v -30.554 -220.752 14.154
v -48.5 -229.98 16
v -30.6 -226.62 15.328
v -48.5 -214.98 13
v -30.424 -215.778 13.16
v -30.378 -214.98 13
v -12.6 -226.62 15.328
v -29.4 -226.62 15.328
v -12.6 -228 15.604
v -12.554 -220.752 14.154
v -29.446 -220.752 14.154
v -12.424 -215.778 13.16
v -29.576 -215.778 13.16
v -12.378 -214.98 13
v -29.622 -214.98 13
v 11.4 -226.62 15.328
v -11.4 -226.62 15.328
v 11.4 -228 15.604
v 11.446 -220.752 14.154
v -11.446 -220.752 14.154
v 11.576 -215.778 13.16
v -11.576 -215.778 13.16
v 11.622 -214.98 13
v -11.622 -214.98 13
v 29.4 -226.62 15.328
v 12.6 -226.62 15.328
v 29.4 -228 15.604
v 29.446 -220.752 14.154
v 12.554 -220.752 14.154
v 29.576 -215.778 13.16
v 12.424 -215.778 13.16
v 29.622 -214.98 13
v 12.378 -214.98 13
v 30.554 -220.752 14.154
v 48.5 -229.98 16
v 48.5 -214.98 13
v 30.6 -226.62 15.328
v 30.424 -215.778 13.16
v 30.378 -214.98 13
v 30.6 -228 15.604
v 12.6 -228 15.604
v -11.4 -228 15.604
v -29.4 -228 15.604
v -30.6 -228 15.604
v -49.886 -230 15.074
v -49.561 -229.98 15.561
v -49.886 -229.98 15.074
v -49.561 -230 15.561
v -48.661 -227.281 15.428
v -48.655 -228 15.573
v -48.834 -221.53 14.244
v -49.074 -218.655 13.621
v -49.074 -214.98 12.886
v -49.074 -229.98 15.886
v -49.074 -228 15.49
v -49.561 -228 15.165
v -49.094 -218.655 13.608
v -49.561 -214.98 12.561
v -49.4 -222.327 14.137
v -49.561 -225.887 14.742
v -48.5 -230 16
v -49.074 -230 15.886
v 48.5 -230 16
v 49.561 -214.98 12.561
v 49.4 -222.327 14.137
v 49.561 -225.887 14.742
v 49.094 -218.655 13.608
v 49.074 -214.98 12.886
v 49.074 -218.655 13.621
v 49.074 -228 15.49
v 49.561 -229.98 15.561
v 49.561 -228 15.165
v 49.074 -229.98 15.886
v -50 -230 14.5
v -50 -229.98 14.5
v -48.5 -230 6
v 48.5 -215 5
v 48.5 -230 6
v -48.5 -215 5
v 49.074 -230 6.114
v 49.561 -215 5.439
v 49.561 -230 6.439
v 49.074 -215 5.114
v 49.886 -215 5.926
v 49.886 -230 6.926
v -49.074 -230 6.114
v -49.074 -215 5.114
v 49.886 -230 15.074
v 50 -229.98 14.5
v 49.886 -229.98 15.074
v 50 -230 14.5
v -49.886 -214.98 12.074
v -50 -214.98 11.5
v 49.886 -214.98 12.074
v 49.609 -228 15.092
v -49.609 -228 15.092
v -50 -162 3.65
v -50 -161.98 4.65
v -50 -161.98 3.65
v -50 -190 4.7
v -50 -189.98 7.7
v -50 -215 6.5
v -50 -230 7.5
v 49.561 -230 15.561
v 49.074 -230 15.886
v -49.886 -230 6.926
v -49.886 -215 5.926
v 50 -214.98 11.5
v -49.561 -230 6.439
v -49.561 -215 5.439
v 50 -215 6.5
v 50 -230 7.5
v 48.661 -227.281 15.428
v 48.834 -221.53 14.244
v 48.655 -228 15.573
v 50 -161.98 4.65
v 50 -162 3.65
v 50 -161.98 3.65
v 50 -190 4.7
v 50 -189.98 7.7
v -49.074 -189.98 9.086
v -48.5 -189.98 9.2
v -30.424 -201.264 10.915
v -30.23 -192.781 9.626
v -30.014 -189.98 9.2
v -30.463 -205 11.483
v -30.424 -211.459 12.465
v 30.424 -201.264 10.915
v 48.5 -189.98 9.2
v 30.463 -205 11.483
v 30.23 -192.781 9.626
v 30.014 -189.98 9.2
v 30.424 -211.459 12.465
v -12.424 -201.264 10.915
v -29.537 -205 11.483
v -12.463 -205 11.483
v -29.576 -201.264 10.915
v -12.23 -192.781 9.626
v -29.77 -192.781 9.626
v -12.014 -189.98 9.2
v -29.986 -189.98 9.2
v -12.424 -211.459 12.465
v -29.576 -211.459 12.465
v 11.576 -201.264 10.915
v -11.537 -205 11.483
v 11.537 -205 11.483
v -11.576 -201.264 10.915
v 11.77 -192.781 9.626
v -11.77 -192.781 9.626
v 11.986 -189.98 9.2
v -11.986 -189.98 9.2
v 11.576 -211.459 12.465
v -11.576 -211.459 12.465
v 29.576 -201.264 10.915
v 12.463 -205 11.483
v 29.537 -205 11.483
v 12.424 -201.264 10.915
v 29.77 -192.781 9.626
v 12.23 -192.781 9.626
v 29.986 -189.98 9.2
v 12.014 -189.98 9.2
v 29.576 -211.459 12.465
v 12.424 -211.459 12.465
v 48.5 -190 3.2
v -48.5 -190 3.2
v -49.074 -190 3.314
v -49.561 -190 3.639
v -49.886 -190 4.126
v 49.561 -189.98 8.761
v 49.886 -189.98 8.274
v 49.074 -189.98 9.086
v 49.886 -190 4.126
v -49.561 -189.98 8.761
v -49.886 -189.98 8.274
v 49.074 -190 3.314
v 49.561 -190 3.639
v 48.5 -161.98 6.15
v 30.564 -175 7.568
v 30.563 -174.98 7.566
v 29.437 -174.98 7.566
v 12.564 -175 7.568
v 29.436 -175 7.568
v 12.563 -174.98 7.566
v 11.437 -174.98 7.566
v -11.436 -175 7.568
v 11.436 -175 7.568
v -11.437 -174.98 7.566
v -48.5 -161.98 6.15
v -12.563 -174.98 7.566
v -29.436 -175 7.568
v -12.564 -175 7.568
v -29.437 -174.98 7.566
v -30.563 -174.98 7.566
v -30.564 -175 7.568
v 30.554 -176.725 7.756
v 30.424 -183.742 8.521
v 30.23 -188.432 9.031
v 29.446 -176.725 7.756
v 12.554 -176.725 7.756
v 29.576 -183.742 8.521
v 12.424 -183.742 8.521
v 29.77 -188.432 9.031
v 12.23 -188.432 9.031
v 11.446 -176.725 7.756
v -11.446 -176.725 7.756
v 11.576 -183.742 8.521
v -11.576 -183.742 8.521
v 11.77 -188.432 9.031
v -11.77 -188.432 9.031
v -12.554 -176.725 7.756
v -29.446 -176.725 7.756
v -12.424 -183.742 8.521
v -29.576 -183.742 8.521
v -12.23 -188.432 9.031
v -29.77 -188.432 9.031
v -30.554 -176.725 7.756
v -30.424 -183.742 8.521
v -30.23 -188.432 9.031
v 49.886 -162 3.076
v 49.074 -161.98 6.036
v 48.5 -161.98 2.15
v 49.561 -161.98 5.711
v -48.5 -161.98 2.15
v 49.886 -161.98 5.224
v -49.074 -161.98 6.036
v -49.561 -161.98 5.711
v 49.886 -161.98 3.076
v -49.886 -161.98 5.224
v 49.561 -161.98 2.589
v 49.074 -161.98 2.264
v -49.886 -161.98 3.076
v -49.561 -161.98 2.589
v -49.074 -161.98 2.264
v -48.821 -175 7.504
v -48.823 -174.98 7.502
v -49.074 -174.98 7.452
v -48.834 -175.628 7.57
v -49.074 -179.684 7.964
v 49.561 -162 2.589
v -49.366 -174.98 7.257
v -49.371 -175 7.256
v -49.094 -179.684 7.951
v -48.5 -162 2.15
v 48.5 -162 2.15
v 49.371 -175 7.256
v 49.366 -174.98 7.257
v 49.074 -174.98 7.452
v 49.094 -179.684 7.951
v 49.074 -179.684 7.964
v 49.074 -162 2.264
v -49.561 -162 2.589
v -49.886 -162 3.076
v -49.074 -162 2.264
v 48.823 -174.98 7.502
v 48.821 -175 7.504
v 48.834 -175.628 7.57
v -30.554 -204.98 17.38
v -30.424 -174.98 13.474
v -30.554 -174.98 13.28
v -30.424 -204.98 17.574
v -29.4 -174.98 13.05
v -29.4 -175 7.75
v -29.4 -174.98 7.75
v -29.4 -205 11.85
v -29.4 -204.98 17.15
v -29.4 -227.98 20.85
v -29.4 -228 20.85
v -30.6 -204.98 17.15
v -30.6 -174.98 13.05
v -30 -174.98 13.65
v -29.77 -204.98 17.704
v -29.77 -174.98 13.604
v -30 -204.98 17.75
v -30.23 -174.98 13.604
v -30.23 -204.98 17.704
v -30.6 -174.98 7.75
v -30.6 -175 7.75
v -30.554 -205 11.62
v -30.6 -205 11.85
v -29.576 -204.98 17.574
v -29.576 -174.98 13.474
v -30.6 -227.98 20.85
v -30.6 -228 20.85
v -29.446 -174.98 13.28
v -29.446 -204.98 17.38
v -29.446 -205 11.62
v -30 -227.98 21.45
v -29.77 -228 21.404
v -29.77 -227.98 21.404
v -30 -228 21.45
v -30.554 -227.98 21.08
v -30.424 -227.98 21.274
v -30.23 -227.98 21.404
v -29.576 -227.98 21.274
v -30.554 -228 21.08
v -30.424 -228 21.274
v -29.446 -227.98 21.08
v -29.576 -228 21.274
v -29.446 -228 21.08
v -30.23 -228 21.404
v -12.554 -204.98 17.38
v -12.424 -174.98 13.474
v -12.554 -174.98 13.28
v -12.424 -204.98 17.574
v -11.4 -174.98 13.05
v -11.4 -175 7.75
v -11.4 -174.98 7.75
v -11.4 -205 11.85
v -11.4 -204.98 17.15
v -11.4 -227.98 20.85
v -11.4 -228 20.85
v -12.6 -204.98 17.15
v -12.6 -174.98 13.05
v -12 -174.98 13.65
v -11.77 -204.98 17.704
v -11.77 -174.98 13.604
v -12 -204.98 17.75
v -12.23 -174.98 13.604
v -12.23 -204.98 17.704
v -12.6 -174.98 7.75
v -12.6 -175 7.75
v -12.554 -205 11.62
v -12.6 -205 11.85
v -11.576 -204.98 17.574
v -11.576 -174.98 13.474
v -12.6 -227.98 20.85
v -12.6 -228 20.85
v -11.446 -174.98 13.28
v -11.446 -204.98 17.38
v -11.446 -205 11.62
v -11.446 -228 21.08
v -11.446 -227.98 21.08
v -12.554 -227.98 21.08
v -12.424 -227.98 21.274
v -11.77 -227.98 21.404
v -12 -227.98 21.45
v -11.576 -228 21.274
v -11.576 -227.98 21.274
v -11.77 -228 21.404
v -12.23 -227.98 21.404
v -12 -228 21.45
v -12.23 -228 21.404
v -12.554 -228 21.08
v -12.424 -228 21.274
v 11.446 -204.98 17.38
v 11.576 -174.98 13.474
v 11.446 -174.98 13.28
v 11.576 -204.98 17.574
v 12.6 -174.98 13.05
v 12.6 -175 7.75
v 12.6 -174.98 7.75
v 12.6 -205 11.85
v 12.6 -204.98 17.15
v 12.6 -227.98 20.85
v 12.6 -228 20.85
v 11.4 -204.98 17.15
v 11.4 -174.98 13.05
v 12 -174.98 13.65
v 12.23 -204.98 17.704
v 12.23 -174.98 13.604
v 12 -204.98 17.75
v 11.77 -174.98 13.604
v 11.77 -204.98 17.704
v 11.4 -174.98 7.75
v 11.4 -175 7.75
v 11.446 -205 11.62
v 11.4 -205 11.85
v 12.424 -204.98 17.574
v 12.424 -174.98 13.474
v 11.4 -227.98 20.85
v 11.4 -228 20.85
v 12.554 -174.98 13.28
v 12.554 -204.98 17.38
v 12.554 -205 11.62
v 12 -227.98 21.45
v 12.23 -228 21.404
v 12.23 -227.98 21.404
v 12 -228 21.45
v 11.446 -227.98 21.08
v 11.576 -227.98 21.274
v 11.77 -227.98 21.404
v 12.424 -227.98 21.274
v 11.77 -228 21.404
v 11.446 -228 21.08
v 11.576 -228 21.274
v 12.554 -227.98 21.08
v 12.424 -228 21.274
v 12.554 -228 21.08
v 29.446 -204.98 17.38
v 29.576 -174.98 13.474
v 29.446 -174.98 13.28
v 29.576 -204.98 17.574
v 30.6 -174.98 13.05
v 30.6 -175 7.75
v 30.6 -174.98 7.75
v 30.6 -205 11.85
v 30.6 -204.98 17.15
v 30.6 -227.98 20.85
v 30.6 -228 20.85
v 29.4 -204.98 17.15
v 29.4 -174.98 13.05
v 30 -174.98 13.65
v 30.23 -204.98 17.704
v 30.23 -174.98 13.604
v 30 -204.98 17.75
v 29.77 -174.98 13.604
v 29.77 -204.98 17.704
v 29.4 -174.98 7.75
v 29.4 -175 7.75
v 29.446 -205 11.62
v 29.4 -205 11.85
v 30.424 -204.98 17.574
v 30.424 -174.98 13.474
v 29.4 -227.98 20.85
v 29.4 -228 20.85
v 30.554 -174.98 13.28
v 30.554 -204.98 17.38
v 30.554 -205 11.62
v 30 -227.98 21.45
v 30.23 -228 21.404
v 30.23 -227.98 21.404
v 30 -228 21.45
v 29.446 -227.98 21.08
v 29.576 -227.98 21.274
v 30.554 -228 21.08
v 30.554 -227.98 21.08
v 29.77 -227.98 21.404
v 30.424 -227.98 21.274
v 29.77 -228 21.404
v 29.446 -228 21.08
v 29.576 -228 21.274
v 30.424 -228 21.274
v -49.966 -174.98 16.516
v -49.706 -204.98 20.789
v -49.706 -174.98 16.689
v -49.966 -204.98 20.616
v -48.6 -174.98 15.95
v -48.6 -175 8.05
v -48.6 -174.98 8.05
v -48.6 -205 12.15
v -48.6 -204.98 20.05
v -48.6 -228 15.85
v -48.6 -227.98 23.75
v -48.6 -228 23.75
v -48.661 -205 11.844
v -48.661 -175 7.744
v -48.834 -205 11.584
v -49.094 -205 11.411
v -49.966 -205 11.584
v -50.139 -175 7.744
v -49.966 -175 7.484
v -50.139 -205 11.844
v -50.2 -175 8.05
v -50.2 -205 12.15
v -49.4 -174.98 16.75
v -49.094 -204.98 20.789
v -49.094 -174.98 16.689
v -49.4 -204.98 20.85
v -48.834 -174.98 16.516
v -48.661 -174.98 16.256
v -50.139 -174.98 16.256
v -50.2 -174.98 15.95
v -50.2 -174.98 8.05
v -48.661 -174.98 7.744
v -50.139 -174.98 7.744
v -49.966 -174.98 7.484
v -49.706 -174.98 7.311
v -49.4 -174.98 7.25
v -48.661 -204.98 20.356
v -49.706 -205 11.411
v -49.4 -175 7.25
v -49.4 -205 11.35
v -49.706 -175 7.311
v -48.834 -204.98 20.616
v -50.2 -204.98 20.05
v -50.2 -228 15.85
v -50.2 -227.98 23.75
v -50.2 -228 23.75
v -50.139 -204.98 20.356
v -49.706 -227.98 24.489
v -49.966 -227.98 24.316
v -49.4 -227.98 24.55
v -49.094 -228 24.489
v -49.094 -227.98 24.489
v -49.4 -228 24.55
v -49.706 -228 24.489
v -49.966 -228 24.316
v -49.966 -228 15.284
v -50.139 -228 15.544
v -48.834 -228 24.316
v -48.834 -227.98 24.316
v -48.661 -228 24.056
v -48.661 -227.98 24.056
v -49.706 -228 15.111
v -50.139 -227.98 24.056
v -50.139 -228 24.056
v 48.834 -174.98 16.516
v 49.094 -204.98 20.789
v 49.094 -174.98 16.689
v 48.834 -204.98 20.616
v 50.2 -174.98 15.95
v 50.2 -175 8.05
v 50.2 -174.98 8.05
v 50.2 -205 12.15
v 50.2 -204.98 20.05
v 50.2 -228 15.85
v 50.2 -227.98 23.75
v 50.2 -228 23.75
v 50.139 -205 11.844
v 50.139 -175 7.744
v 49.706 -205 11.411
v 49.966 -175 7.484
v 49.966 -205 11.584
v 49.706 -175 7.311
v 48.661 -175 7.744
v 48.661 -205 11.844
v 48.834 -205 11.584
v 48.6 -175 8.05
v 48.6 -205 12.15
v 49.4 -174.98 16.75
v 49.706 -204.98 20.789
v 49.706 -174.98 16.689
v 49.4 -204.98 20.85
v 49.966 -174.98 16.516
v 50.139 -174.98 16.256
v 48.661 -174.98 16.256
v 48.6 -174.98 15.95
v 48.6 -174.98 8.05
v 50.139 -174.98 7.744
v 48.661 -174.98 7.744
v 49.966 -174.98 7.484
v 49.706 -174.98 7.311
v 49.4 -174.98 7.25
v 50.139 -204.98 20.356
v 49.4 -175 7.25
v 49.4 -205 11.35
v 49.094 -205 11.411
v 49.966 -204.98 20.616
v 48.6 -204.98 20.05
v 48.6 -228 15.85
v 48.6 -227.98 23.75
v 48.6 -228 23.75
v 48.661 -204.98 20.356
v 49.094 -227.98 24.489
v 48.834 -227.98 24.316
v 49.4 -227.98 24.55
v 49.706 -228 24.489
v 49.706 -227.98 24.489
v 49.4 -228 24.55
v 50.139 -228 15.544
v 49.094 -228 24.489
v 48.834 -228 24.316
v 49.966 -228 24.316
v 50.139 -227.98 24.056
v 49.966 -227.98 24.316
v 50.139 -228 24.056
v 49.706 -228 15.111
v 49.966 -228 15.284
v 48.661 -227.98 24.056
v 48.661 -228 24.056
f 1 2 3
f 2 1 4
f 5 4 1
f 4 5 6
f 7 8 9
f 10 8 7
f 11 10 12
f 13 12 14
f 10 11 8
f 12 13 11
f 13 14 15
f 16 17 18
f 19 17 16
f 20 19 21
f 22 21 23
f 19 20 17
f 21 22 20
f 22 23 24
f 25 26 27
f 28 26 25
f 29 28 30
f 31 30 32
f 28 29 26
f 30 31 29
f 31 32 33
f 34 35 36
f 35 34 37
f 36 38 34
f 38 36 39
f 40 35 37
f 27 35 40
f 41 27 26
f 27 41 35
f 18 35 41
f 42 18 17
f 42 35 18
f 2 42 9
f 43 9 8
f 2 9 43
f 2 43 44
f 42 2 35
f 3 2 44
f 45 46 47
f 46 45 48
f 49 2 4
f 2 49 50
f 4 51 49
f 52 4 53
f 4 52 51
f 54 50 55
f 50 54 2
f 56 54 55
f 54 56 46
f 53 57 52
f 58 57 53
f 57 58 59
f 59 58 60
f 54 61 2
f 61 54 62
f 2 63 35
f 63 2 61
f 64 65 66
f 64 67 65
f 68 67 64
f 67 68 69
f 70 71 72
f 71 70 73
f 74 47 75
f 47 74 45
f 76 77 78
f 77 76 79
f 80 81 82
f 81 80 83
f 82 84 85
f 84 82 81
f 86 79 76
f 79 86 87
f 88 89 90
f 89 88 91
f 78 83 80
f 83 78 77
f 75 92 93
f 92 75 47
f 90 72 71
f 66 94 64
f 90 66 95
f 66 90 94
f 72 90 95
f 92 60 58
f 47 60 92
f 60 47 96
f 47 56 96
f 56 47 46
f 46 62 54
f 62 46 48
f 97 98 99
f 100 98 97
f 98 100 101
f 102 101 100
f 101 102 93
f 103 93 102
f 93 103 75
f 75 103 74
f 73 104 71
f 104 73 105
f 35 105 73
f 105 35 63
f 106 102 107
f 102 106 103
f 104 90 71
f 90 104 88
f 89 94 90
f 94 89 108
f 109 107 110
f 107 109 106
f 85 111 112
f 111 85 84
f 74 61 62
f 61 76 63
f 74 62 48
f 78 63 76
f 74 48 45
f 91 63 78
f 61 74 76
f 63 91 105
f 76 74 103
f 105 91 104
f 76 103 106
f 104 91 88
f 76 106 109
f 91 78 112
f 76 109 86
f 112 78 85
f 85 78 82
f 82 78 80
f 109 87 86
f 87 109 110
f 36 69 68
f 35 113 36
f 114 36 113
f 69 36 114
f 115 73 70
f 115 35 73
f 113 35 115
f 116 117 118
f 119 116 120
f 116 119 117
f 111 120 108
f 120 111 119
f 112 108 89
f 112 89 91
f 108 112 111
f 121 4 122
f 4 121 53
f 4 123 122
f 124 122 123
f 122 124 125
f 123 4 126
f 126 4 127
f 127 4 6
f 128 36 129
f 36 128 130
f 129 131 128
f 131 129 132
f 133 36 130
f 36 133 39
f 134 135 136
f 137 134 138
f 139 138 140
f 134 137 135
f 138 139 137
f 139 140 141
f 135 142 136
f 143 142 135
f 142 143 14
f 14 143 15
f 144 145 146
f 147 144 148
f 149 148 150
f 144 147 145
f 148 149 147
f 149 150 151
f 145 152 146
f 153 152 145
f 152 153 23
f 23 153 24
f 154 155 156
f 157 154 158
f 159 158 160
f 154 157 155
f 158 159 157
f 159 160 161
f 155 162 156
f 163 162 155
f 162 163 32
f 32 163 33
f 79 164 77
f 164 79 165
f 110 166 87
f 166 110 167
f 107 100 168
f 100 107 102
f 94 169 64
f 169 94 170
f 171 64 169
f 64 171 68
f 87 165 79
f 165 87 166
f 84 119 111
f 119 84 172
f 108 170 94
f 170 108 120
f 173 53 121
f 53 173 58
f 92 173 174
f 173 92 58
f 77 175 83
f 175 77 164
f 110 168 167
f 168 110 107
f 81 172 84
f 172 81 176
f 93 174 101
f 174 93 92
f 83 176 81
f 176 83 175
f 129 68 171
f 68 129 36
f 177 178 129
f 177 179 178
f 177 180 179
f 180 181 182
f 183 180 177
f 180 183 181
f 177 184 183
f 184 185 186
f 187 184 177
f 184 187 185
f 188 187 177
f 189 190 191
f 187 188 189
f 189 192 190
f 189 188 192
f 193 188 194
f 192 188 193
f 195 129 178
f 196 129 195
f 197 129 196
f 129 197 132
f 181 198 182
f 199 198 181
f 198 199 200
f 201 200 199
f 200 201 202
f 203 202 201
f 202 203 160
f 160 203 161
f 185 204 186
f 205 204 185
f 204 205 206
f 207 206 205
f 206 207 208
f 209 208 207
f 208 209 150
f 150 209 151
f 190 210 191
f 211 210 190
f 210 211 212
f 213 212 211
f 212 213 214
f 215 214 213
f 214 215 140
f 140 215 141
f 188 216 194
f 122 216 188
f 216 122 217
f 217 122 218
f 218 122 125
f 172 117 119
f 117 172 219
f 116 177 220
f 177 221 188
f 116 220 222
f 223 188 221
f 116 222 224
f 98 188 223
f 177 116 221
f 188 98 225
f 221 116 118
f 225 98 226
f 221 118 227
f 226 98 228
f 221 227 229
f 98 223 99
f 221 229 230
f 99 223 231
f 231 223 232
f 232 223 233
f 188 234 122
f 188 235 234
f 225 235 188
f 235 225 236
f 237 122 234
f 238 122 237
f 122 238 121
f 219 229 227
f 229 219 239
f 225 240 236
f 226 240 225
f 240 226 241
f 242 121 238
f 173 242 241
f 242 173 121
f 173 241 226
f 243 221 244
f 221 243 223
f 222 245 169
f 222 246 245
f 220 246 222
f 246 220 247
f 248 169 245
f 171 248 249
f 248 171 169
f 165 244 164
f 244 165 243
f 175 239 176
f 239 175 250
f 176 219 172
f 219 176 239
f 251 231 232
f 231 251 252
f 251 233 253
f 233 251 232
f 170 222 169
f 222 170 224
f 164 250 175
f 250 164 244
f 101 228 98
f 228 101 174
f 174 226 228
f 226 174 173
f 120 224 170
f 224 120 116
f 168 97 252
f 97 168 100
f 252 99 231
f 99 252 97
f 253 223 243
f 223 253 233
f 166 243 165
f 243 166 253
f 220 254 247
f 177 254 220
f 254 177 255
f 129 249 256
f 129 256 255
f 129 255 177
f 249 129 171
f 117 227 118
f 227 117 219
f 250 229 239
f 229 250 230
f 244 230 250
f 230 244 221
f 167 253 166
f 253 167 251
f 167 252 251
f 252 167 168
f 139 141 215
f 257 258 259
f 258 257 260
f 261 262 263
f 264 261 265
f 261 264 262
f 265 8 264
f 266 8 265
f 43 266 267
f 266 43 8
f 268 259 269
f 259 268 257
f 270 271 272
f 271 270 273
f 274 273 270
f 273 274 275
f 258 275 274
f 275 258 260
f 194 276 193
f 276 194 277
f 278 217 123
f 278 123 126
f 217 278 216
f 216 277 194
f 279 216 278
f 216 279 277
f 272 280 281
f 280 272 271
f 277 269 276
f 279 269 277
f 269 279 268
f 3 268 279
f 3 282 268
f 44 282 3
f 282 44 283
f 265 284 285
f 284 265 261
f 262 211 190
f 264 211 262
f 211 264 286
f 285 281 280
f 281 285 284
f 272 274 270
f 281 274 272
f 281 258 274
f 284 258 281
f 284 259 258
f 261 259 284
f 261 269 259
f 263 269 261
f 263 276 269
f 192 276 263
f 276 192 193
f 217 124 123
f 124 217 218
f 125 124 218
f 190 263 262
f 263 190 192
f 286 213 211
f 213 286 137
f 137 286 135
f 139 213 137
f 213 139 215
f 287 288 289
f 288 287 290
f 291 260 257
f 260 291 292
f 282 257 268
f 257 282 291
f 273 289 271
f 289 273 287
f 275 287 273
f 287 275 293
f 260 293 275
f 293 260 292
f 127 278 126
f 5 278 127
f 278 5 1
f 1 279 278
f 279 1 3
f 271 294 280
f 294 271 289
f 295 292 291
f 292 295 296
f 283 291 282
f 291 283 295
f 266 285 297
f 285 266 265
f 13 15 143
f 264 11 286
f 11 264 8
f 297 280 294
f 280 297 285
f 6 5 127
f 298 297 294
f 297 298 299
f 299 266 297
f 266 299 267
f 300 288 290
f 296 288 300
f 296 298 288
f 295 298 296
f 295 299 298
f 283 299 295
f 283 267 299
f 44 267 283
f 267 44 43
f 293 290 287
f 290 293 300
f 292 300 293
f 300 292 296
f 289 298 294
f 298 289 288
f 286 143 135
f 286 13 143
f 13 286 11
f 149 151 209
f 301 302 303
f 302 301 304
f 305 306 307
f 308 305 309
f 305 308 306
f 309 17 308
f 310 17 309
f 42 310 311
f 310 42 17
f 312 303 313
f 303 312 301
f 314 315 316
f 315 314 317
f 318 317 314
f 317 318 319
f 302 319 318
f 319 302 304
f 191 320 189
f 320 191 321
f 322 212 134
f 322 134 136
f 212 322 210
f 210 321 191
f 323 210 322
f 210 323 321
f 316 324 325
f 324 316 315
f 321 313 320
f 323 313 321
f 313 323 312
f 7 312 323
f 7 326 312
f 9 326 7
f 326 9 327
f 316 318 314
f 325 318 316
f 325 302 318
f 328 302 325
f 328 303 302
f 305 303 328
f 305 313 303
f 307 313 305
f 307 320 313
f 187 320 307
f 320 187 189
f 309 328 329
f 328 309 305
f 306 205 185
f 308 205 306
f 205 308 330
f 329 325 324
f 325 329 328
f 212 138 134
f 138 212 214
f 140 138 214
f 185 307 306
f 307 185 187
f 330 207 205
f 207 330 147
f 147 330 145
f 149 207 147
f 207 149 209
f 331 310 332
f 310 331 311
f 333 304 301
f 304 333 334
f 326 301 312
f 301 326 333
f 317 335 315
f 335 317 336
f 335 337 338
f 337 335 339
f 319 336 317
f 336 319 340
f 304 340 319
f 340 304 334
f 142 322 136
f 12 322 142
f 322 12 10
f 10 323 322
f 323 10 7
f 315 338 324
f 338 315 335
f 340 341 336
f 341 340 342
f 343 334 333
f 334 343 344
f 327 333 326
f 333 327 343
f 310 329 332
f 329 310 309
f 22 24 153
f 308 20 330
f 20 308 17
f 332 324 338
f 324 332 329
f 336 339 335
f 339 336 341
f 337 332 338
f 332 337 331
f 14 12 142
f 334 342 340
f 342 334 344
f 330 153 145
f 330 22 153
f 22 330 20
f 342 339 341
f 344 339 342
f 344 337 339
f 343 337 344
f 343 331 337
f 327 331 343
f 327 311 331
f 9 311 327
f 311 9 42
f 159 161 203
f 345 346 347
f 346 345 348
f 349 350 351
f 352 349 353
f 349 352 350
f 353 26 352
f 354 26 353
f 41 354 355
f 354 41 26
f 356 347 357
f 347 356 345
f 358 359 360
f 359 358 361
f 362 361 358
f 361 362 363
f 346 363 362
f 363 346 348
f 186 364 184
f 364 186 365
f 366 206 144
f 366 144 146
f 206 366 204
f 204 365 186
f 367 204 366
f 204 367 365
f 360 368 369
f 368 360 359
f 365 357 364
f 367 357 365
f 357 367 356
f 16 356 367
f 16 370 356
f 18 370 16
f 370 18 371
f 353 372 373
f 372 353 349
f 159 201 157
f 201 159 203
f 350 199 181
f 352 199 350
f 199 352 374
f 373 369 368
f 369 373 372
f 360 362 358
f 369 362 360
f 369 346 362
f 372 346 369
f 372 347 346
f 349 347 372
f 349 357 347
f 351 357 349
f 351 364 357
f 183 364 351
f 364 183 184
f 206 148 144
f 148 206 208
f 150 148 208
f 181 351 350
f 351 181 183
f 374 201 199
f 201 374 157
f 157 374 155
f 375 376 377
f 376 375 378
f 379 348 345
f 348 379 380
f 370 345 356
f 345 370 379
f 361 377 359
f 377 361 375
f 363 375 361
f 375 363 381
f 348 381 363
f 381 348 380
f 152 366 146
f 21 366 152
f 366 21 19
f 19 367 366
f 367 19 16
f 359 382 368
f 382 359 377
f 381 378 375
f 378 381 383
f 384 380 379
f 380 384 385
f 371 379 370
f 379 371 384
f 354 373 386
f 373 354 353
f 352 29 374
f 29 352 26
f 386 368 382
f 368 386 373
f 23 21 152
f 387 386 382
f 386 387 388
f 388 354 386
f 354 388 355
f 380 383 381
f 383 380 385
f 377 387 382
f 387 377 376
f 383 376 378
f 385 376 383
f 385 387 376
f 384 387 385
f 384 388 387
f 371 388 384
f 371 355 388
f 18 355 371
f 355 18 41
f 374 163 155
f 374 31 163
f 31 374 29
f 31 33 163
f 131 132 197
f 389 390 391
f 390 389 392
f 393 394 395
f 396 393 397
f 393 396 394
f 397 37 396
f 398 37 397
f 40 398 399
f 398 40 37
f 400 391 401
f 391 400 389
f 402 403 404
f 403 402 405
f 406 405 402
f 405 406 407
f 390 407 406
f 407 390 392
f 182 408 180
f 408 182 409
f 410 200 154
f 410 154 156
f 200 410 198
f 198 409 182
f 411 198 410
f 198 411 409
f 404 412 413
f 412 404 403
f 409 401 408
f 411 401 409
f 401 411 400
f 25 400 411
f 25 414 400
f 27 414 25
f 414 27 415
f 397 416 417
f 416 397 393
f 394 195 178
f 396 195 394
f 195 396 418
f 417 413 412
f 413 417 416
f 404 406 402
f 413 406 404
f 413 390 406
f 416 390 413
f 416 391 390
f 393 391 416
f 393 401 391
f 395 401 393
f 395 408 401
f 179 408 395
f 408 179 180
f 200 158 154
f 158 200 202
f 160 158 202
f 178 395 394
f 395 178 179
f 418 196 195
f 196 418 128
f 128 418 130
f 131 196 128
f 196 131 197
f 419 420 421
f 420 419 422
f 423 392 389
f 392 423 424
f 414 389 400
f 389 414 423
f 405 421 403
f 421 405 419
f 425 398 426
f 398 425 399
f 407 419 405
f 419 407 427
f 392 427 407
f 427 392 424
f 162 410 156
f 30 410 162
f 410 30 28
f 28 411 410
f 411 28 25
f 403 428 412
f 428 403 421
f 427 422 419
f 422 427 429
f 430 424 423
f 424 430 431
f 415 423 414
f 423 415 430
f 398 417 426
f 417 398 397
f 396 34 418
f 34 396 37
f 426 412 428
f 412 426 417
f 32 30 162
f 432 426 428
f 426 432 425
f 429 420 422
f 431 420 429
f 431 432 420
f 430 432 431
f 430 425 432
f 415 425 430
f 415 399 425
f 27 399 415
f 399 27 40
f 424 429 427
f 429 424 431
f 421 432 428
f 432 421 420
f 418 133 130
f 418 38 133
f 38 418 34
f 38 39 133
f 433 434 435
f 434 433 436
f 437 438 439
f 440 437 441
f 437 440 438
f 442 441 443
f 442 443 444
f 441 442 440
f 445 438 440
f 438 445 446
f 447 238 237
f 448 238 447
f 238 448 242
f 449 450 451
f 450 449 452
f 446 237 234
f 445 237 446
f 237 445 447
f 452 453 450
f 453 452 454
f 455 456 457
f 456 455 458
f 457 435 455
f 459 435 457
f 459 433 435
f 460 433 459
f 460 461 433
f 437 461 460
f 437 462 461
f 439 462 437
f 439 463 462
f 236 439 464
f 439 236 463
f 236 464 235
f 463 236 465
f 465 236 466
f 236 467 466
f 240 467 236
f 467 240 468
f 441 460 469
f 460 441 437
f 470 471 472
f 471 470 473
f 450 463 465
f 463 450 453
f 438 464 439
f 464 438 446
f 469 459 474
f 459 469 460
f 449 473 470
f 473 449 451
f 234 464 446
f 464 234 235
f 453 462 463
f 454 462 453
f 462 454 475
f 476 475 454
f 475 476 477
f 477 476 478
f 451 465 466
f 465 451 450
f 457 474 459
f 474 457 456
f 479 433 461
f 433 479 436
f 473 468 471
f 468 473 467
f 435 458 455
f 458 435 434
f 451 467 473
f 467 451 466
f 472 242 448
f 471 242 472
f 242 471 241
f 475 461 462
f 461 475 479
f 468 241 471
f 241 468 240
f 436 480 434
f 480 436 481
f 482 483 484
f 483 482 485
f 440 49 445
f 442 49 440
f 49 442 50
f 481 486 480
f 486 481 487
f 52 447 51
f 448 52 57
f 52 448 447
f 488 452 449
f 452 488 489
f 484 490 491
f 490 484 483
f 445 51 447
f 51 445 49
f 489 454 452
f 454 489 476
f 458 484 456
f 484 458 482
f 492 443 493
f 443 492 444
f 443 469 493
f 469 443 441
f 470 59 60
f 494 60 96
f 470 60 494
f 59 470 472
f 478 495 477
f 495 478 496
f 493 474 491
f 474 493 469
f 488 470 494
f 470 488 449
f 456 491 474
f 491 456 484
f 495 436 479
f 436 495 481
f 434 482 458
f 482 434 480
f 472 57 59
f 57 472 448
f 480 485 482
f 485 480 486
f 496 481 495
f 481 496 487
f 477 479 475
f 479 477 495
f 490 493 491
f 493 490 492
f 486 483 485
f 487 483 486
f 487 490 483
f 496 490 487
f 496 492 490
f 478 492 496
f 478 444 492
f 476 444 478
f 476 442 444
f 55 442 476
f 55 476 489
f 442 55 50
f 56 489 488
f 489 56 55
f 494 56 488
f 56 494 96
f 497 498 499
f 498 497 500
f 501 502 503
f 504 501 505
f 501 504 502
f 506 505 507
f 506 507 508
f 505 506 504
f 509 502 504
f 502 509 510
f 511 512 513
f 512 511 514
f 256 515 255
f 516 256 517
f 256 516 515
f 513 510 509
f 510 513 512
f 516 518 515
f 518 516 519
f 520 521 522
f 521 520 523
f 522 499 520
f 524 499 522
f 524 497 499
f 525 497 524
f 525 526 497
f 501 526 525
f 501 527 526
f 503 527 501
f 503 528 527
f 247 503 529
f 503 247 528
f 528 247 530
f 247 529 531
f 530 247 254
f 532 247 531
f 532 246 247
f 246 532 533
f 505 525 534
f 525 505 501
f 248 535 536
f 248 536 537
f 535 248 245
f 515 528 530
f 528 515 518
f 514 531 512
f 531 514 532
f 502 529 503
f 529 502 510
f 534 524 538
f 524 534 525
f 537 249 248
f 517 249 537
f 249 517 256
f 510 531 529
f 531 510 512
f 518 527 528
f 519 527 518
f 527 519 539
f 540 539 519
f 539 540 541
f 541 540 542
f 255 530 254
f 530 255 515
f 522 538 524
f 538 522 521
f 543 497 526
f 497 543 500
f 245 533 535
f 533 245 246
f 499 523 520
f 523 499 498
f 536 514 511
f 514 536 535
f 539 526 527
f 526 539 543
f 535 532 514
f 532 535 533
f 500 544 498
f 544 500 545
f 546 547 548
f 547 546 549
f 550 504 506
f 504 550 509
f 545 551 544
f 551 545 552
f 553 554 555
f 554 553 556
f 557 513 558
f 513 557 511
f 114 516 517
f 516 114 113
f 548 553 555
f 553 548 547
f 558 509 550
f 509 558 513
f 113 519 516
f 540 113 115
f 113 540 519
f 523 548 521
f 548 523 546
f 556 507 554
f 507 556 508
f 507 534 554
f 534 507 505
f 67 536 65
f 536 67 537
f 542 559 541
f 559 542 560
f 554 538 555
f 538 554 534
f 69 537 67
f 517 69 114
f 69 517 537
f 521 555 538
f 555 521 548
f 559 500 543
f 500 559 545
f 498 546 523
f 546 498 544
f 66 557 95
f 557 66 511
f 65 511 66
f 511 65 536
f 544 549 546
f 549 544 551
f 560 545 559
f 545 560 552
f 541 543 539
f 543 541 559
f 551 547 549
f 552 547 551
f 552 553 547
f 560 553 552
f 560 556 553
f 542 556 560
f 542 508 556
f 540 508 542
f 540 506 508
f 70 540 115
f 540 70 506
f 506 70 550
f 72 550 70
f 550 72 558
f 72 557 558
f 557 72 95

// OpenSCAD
// file: ../lib.scad
// ===== 공용 프리미티브 (params 의존 없음 — use로 포함. 함정 1) =====

// 두 점을 잇는 캡슐. 끝단이 od/2 만큼 뻗는다 (함정 3)
module rod(p1, p2, od, fn = 56)
    hull() { translate(p1) sphere(d = od, $fn = fn);
             translate(p2) sphere(d = od, $fn = fn); }

function mir(p, s = 1) = [s * p.x, p.y, p.z];

// --- 라운디드 사각 2D 폴리곤 (CCW) ---
function arc_pt(cx, cy, r, a) = [cx + r * cos(a), cy + r * sin(a)];
function rrpts(w, h, r, n = 4) =
    let (x = w / 2 - r, y = h / 2 - r)
    concat(
        [for (i = [0:n]) arc_pt( x, -y, r, -90 + 90 * i / n)],
        [for (i = [0:n]) arc_pt( x,  y, r,   0 + 90 * i / n)],
        [for (i = [0:n]) arc_pt(-x,  y, r,  90 + 90 * i / n)],
        [for (i = [0:n]) arc_pt(-x, -y, r, 180 + 90 * i / n)]);

// y 위치의 XZ 단면 슬래브 (중심 x0/zc, 폭 w/높이 h, 모서리 r).
// 회전 매핑: 2D x→차량 X, 2D y→차량 Z, 돌출 +z→−Y (y..y+0.02 전방 전용, 함정 20)
module slabr(y, x0, w, h, zc, r)
    translate([x0, y + 0.02, zc]) rotate([90, 0, 0])
        linear_extrude(0.02) polygon(rrpts(w, h, r));

// 단면 체인 loft: sec = [[y, x0, w, h, zc, r], ...]
module loftr(sec)
    for (i = [0 : len(sec) - 2])
        hull() {
            slabr(sec[i][0],     sec[i][1],     sec[i][2],     sec[i][3],     sec[i][4],     sec[i][5]);
            slabr(sec[i + 1][0], sec[i + 1][1], sec[i + 1][2], sec[i + 1][3], sec[i + 1][4], sec[i + 1][5]);
        }

// 라운디드 박스 (z0..z1 수직, 평면 모서리 r)
module rbox(xc, yc, z0, z1, dx, dy, r, fn = 32)
    hull() for (px = [-1, 1], py = [-1, 1])
        translate([xc + px * (dx / 2 - r), yc + py * (dy / 2 - r), z0])
            cylinder(r = r, h = z1 - z0, $fn = fn);

// --- NACA 계열 에어포일 (LE 원점, 2D +x = 현 방향) ---
function _yt(x, c, t) = 5 * t * c * (0.2969*sqrt(x) - 0.1260*x - 0.3516*x*x
    + 0.2843*x*x*x - 0.1036*x*x*x*x);
function _yc(x, c, m) = 4 * m * c * x * (1 - x);
function naca_pts(c, t, m, n = 12) =
    concat(
        [for (i = [0:n])     let (x = i / n)     [x*c,  _yt(x, c, t) + _yc(x, c, m)]],
        [for (i = [n-1:-1:0]) let (x = i / n)    [x*c, -_yt(x, c, t) + _yc(x, c, m)]]);

// 슬라이스 3D 링: v=[x, yle, zle, c, aoa, th, cam] → 받각 회전된 naca 점의 링
// (th/cam은 mm — 현 대비 비율로 정규화)
function wring(v, n = 12) =
    let (c = v[3], t = v[5] / c, m = v[6] / c, pts = naca_pts(c, t, m, n),
         ca = cos(v[4]), sa = sin(v[4]))
    // 코드 방향 (ca,sa) + 두께/캠버 수직 방향 (-sa,ca) — 2D y 누락 금지
    [for (p = pts) [v[0], v[1] + p[0] * ca - p[1] * sa, v[2] + p[0] * sa + p[1] * ca]];

// 진짜 로프트 윙 — polyhedron 스트립. hull 체인은 캠버진 하면을 볼록 껍질로
// 채워(LE→TE 직선 웨지) 요소가 처지므로 쓰지 않는다
module wing3(sl, n = 12) {
    rings = [for (v = sl) wring(v, n)];
    ns = len(rings);
    m = len(rings[0]);
    pts = [for (r = rings, p = r) p];
    function ix(i, k) = i * m + (k % m);
    faces = concat(
        // 측면 스트립 (사중면 → 삼각형 2) — 외향 노멀 권선(캡과 일치)
        [for (i = [0 : ns - 2], k = [0 : m - 1])
            each [[ix(i, k), ix(i, k + 1), ix(i + 1, k + 1)],
                  [ix(i, k), ix(i + 1, k + 1), ix(i + 1, k)]]],
        // 끝 캡 (링은 단순 폴리곤 — 팬 삼각분할)
        [for (k = [1 : m - 2]) [ix(0, 0), ix(0, k + 1), ix(0, k)]],
        [for (k = [1 : m - 2]) [ix(ns - 1, 0), ix(ns - 1, k), ix(ns - 1, k + 1)]]
    );
    polyhedron(points = pts, faces = faces, convexity = 4);
}

// 반쪽 슬라이스 → x-대칭 전체. 규약: half는 센터(x=0)→팁 순서(내림차순 x).
// 결과는 x 오름차순 체인. x=0 센터만 중복 제외 (그 외 전부 미러)
function wsym(half) =
    concat([for (i = [len(half) - 1 : -1 : 0]) half[i]],
           [for (i = [0 : len(half) - 1]) if (abs(half[i][0]) > 1e-9)
               concat([-half[i][0]], [for (j = [1 : len(half[i]) - 1]) half[i][j]])]);

// 환(링), 축 Z
module ann(r_in, r_out, h, fn = 96)
    difference() { cylinder(r = r_out, h = h, center = true, $fn = fn);
                   cylinder(r = r_in,  h = h + 2, center = true, $fn = fn); }

// 리스트 전체 x반전+순서 역행 (센터 구간 없는 플랩 등 — 좌우 별도 wing3 호출용).
// x반전만 하면 행렬식이 음수가 되어 권선이 뒤집힌다 → 순서 역행으로 상쇄
function msym(half) =
    [for (i = [len(half) - 1 : -1 : 0])
        concat([-half[i][0]], [for (j = [1 : len(half[i]) - 1]) half[i][j]])];
// file: ../params.scad
// =====================================================================
// F1 그랜드파이언스 카 1:10 — 전체 파라미터 (유일한 수정 지점)
// 좌표계: +Y 전방, +X 좌측, +Z 상방, 지면 z=0, 원점=휠베이스 중심
// 전장 558 (y -268..+278), 전폭 194, 휠베이스 360, 타이어 OD 72 (720mm)
// 30부품. loftr 단면 = [y, x0, w, h, zc, r] (XZ 단면, y..y+0.02 슬래브)
// wing3 슬라이스 = [x, yle, zle, c, aoa, th, cam]
//   aoa: 현 방향의 X축 회전각. 전방 받각 요소는 165~170 (TE가 뒤+위)
// =====================================================================
$fn = 96;

// -- 휠/액슬 (실차 720mm 타이어, 18인치 림, 트랙 F1600/R1550) --
AXF_Y = 180;   AXR_Y = -180;
WHF_X = 80;    WHR_X = 77.5;
WH_Z  = 36;
TIRF_W = 30.5; TIRR_W = 40.5;  TIR_R = 36;
TIR_FN = 288;                 // 타이어 회전체 해상도
RIM_R = 23.2;  RIM_T = 1.0;   // 림 배럴 반경/두께
RIM_LF = 12.4; RIM_LR = 17.4; // 림 배럴 반폭
HUB_BORE = 7.0; STUB_D = 6.2; // 방사 간극 0.4
DISC_R = 15.5;                // 브레이크 디스크

// -- 바디 공통 레벨 --
FLO_Z0 = 2.0;  FLO_Z1 = 5.5;  // 플로어 (두께 3.5)
BOD_Z0 = 5.65;                // 샤시/카버/기어박스 바닥 (플로어 위 0.15)
J = 0.15;                     // 부품 접합 기본 간극
ARM_OD = 3.4;                 // 서스펜션 암 캡슐 직경

// ===== 01 플로어 =====
FLOOR_SEC = [
    [132,    0,  92, 3.5, 3.75, 1.5], [100, 0, 118, 3.5, 3.75, 1.5],
    [60,     0, 130, 3.5, 3.75, 2.0], [10,  0, 132, 3.5, 3.75, 2.0],
    [-60,    0, 128, 3.5, 3.75, 2.0], [-120, 0, 112, 3.5, 3.75, 2.0],
    [-161.85, 0, 100, 3.5, 3.75, 2.0]];

// ===== 02 디퓨저 (램프 + 스트레이크는 부품 내부) =====
DIFF_SEC = [
    [-230,   0, 100, 10.0, 11.0, 1.5], [-215, 0, 100, 8.0,  9.0, 1.5],
    [-190,   0, 100,  6.0,  6.2, 1.5], [-162.0, 0, 100, 4.0, 4.15, 1.5]];
DIFF_TOP = [[-175, 7.8], [-205, 11.9], [-228, 15.6]];  // (y, 램프 상면 z)

// ===== 03 플로어 에지 윙 =====
FEW_SEC = [   // [y, x0, w, h, zc, r] — x0 부호로 좌우
    [55,   63.5, 3.0, 2.0, 6.65, 1.0], [-5,  65.5, 3.0, 5.5, 8.40, 1.5],
    [-70,  63.0, 3.0, 4.0, 7.65, 1.5], [-120, 58.0, 3.0, 3.0, 7.15, 1.5]];
FEW2_SEC = [
    [100, 57.0, 2.5, 1.5, 6.40, 0.8], [60, 60.0, 2.5, 2.0, 6.65, 0.8]];

// ===== 04 노우즈 =====
NOSE_SEC = [
    [95,   0, 38, 28, 25.3, 12], [100,  0, 38, 29, 25.3, 12],
    [115,  0, 36, 28, 23.8, 11], [135,  0, 31, 24, 21.3,  9],
    [160,  0, 27, 20, 18.3,  8], [185,  0, 23, 17, 15.8,  7],
    [205,  0, 20, 15, 14.3,  6], [224,  0, 17, 12, 12.3,  5],
    [242,  0, 14,  9, 10.8,  4], [258,  0, 10,  7, 10.1,  3],
    [272,  0,  4.5, 4.5, 9.8, 2], [273.5, 0, 1.2, 1.2, 9.8, 0.6]];

// ===== 05 샤시(모노코크) + 콕핏 컷 =====
CHAS_SEC = [
    [-34.85, 0, 46, 44, 27.65, 15], [-10, 0, 48, 46, 28.65, 15],
    [20,     0, 48, 44, 27.65, 15], [60,  0, 46, 40, 25.65, 14],
    [94.85,  0, 42, 34, 22.65, 12]];
CKP_CUT = [[62, 0, 34, 32, 46, 3], [-30, 0, 34, 30, 45, 3]];

// ===== 06 엔진 커버 + 샤크핀 =====
COV_SEC = [
    [-152,   0,  8, 14, 35.65,  6], [-140, 0, 12, 18, 32.65,  7],
    [-120,   0, 18, 24, 29.65,  9], [-95,  0, 26, 30, 26.15, 11],
    [-70,    0, 34, 36, 25.65, 13], [-50,  0, 40, 40, 25.65, 14],
    [-35.15, 0, 44, 42, 26.65, 15]];
FIN_SEC = [
    [-162, 0, 2.2, 44, 62.0, 1], [-120, 0, 2.5, 30, 56.0, 1],
    [-92.2, 0, 2.5, 10, 45.0, 1]];

// ===== 07 에어박스 (험프 + 인테이크 링) =====
ABX_SEC = [
    [-92, 0, 14, 17, 50.00, 6], [-68, 0, 20, 24, 56.60, 8],
    [-46, 0, 22, 26, 59.60, 8], [-34, 0, 22, 13, 56.30, 6]];
ABX_RING_C = [0, -45, 73.5];  ABX_RING_R = 11;  ABX_RING_T = 4.5;
ABX_RING_SZ = 0.72;

// ===== 08 사이드포드 (x0=±41.5) =====
SPOD_X0 = 41.5;
SPOD_SEC = [   // [y, w, h, zc, r]
    [38,   34, 26, 18.65, 8], [5,   34, 28, 19.65, 9], [-25,  34, 26, 18.65, 9],
    [-55,  32, 21, 18.15, 8], [-80, 30, 15, 17.15, 8], [-100, 26,  9, 16.15, 7]];
SPOD_INLET = [24, 18, 19, 2.3];  // 컷: w, h, zc, 깊이

// ===== 09 할로 =====
HALO_N = 28;  HALO_OD = 9;
HALO_RX = 22; HALO_RY = 44; HALO_CY = 12;  // 타원 계획면(평면도)
HALO_Z0 = 75; HALO_ZA = 2;                 // z(t) = Z0 + ZA*cos(t)

// ===== 10/11/12/13 프런트 윙 =====
FW_MAIN_HALF = [   // 반쪽(x≤0) — wsym()로 전체화
    [0,    258.3, 2.4, 20, 170, 1.4, 2.0],
    [-16,  259.0, 3.4, 27, 165, 1.6, 2.4],
    [-40,  260.0, 3.6, 40, 166, 1.8, 2.8],
    [-60,  257.0, 4.0, 37, 167, 1.7, 2.6],
    [-80,  258.0, 4.4, 31, 166, 1.6, 2.2],
    [-95.2, 263.0, 4.6, 26, 166, 1.5, 1.8]];
FW_F1_HALF = [
    [-16,  253.0, 8.0, 22, 155, 1.3, 4.0],
    [-40,  250.5, 8.2, 26, 156, 1.4, 4.2],
    [-60,  249.5, 8.4, 26, 157, 1.4, 4.2],
    [-80,  250.0, 8.6, 24, 158, 1.4, 4.0],
    [-95.2, 254.0, 8.8, 21, 158, 1.3, 3.5]];
FW_F2_HALF = [
    [-16,  258.0, 12.4, 17, 147, 1.2, 4.5],
    [-40,  255.5, 12.6, 20, 148, 1.3, 4.8],
    [-60,  254.5, 12.8, 20, 149, 1.3, 4.8],
    [-80,  254.5, 13.0, 19, 150, 1.3, 4.5],
    [-95.2, 258.0, 13.2, 17, 150, 1.2, 4.0]];
FW_EP_X = 96.3;  FW_EP_T = 1.5;   // 엔드플레이트 x 중심/두께
FW_EP_PTS = [    // (y,z) 아웃라인
    [226, 1.5], [266, 1.5], [266, 8], [263, 24.5], [252, 24.5],
    [244, 17], [233, 15], [226, 9]];
FW_MT_SEC = [   // 마운트 플레이트 [y, x0(±2.6), w, h, zc, r] — 노우즈 저면 라운딩 회피
    [244, 2.6, 1.6, 1.8, 5.25, 0.5], [250, 2.6, 1.6, 1.8, 5.25, 0.5]];

// ===== 14 리어 윙 =====
RW_MAIN = [
    [-50.8, -212, 57.5, 46, 162, 2.2, -3.5], [-25, -211, 56.6, 47, 162, 2.3, -4.0],
    [0,     -210, 54.2, 47, 162, 2.3, -4.0], [25,  -211, 56.6, 47, 162, 2.3, -4.0],
    [50.8,  -212, 57.5, 46, 162, 2.2, -3.5]];
RW_FLAP = [
    [-49.6, -234,   71.8, 30, 155, 1.8, -4.5],
    [0,     -235.5, 73.0, 30, 155, 1.8, -4.5],
    [49.6,  -234,   71.8, 30, 155, 1.8, -4.5]];
RW_EP_X = 52;  RW_EP_T = 2;
RW_EP_PTS = [
    [-200, 46], [-268, 46], [-268, 60], [-262, 93], [-250, 93],
    [-243, 72], [-218, 64], [-202, 74]];
RW_DRS = [-245, 79.4, 5.0, 2.6, 3.0];   // 팟: y, z, w, h, 두께

// ===== 15 빔 윙 =====
BEAM_E1 = [
    [-50.9, -204.5, 31.5, 16, 162, 1.8, -2.5], [0, -205.5, 30.4, 16, 162, 1.8, -2.5],
    [50.9,  -204.5, 31.5, 16, 162, 1.8, -2.5]];
BEAM_E2 = [
    [-50.9, -210, 36.8, 15, 158, 1.6, -3.0], [0, -211, 35.6, 15, 158, 1.6, -3.0],
    [50.9,  -210, 36.8, 15, 158, 1.6, -3.0]];
BEAM_PLATE = [-214, -200.15, 8.2, 22, 31];  // 마운트 플레이트 y1,y0,x반폭,z0,z1

// ===== 16 리어윙 파일론(쌍둥 스완넥) =====
RW_PYL = [[-158, 55.0], [-190, 58.0], [-212.5, 63.0]];  // (y, z), x=±5.4
RW_PYL_X = 5.4;  RW_PYL_OD = 8;

// ===== 17 미러 =====
MIR_BASE = [14, 63, 46.0];  MIR_HOUSE = [31, 66, 56.5];

// ===== 18 헬멧 =====
HELM_C = [0, 0, 55];  HELM_R = 11.5;
HELM_SC = [1, 1.18, 1.02];

// ===== 19 콕핏 트림 =====
SEAT_SEC  = [[30, 0, 26, 13.2, 36.75, 3], [-10, 0, 26, 13.2, 36.75, 3]];
HREST_SEC = [[12, 0, 32, 15, 53.5, 5], [-20, 0, 32, 15, 53.5, 5]];

// ===== 20 스티어링 휠 =====
SW_C = [0, 40, 47];  SW_TILT = 20;

// ===== 21/22 서스펜션 (픽업=[x, y, z], 암 끝은 업라이트 내부) =====
FUP = [61, 183, 46];  FLO_BALL = [61.5, 181, 24];  FTR = [61.5, 177, 35];
FPU = [61.5, 180, 27];
F_ARM = [   // [픽업, 볼]
    [[12.0, 206, 20.0], FUP],  [[16.0, 152, 23.0], FUP],
    [[11.9, 208,  9.3], FLO_BALL], [[16.3, 150, 12.0], FLO_BALL],
    [[15.6, 162, 14.0], FTR]];
F_PUSH = [[11.8, 198, 24.4], FPU];
RUP = [53.5, -182, 46];  RLO = [54, -179, 23];  RDRIVE_O = [52, -180, 31];
R_ARM = [
    [[13.3, -160, 47.0], RUP], [[13.3, -198, 45.0], RUP],
    [[12.8, -158, 20.4], RLO], [[9.2, -202, 19.6], RLO]];
R_PULL = [[12.6, -177, 23.75], [53.5, -181, 44]];
R_DRIVE = [[13.2, -180, 17.0], RDRIVE_O];

// ===== 23/24 브레이크 스쿱 =====
SCOOP_F = [[164.2, 59.5, 7, 11, 30, 3], [158, 58.5, 5.5, 8, 28.5, 2.5]];
SCOOP_R = [[-164.2, 48, 7, 10, 29, 3], [-158, 46, 5, 7.5, 27.5, 2.5]];

// ===== 25~28 타이어/림 =====
TIRE_BEAD = 2.6;   // 비드 안쪽 세팅 (단면 반경 23.4)

// ===== 29 기어박스 + 리어 크래시 =====
GEAR_SEC = [
    [-258,   0,  4,  1.8, 15.00, 1.5], [-252, 0,  6,  1.6, 16.30, 2],
    [-230,   0,  9,  1.4, 18.30, 3],   [-208, 0, 12,  4.9, 15.05, 4],
    [-195,   0, 16,  9.35, 14.83, 5],   [-170, 0, 20, 15.1, 15.45, 6],
    [-145,   0, 22, 15.95, 13.60, 7],  [-117.85, 0, 26, 8.6,  9.95, 8]];
GEAR_TOWER = [-200, -158, 8, 11.3, 28, 50];  // y1,y0,x내측,x외측,z0,z1
RAIN_LT = [-258.6, 5, 4];   // y면, w, h

// ===== 30 카메라/안테나 =====
TCAM_Y = -45;  TCAM_Z0 = 84.8;
SIDECAM = [[194, 19.0], [202, 18.5]];  // (y, z) — x는 노우즈 반폭+0.15
ANT = [[4, 70], [-4, 70]];             // (x, y) — chassis 탑
// main file
// 02 리어 디퓨저 — 확장 램프 + 스트레이크 + 측벽
include <../params.scad>
use <../lib.scad>

module diffuser() {
    loftr(DIFF_SEC);
    // 스트레이크 4 (램프 상면에서 솟음 — 부품 내부 겹침)
    for (x0 = [-30, -12, 12, 30])
        loftr([for (s = DIFF_TOP) [s[0], x0, 1.2, 6.5, s[1] + 2.6, 0.6]]);
    // 측벽 2
    for (x0 = [-49.4, 49.4])
        loftr([for (s = DIFF_TOP) [s[0], x0, 1.6, 9.5, s[1] + 4.2, 0.8]]);
}

diffuser();
